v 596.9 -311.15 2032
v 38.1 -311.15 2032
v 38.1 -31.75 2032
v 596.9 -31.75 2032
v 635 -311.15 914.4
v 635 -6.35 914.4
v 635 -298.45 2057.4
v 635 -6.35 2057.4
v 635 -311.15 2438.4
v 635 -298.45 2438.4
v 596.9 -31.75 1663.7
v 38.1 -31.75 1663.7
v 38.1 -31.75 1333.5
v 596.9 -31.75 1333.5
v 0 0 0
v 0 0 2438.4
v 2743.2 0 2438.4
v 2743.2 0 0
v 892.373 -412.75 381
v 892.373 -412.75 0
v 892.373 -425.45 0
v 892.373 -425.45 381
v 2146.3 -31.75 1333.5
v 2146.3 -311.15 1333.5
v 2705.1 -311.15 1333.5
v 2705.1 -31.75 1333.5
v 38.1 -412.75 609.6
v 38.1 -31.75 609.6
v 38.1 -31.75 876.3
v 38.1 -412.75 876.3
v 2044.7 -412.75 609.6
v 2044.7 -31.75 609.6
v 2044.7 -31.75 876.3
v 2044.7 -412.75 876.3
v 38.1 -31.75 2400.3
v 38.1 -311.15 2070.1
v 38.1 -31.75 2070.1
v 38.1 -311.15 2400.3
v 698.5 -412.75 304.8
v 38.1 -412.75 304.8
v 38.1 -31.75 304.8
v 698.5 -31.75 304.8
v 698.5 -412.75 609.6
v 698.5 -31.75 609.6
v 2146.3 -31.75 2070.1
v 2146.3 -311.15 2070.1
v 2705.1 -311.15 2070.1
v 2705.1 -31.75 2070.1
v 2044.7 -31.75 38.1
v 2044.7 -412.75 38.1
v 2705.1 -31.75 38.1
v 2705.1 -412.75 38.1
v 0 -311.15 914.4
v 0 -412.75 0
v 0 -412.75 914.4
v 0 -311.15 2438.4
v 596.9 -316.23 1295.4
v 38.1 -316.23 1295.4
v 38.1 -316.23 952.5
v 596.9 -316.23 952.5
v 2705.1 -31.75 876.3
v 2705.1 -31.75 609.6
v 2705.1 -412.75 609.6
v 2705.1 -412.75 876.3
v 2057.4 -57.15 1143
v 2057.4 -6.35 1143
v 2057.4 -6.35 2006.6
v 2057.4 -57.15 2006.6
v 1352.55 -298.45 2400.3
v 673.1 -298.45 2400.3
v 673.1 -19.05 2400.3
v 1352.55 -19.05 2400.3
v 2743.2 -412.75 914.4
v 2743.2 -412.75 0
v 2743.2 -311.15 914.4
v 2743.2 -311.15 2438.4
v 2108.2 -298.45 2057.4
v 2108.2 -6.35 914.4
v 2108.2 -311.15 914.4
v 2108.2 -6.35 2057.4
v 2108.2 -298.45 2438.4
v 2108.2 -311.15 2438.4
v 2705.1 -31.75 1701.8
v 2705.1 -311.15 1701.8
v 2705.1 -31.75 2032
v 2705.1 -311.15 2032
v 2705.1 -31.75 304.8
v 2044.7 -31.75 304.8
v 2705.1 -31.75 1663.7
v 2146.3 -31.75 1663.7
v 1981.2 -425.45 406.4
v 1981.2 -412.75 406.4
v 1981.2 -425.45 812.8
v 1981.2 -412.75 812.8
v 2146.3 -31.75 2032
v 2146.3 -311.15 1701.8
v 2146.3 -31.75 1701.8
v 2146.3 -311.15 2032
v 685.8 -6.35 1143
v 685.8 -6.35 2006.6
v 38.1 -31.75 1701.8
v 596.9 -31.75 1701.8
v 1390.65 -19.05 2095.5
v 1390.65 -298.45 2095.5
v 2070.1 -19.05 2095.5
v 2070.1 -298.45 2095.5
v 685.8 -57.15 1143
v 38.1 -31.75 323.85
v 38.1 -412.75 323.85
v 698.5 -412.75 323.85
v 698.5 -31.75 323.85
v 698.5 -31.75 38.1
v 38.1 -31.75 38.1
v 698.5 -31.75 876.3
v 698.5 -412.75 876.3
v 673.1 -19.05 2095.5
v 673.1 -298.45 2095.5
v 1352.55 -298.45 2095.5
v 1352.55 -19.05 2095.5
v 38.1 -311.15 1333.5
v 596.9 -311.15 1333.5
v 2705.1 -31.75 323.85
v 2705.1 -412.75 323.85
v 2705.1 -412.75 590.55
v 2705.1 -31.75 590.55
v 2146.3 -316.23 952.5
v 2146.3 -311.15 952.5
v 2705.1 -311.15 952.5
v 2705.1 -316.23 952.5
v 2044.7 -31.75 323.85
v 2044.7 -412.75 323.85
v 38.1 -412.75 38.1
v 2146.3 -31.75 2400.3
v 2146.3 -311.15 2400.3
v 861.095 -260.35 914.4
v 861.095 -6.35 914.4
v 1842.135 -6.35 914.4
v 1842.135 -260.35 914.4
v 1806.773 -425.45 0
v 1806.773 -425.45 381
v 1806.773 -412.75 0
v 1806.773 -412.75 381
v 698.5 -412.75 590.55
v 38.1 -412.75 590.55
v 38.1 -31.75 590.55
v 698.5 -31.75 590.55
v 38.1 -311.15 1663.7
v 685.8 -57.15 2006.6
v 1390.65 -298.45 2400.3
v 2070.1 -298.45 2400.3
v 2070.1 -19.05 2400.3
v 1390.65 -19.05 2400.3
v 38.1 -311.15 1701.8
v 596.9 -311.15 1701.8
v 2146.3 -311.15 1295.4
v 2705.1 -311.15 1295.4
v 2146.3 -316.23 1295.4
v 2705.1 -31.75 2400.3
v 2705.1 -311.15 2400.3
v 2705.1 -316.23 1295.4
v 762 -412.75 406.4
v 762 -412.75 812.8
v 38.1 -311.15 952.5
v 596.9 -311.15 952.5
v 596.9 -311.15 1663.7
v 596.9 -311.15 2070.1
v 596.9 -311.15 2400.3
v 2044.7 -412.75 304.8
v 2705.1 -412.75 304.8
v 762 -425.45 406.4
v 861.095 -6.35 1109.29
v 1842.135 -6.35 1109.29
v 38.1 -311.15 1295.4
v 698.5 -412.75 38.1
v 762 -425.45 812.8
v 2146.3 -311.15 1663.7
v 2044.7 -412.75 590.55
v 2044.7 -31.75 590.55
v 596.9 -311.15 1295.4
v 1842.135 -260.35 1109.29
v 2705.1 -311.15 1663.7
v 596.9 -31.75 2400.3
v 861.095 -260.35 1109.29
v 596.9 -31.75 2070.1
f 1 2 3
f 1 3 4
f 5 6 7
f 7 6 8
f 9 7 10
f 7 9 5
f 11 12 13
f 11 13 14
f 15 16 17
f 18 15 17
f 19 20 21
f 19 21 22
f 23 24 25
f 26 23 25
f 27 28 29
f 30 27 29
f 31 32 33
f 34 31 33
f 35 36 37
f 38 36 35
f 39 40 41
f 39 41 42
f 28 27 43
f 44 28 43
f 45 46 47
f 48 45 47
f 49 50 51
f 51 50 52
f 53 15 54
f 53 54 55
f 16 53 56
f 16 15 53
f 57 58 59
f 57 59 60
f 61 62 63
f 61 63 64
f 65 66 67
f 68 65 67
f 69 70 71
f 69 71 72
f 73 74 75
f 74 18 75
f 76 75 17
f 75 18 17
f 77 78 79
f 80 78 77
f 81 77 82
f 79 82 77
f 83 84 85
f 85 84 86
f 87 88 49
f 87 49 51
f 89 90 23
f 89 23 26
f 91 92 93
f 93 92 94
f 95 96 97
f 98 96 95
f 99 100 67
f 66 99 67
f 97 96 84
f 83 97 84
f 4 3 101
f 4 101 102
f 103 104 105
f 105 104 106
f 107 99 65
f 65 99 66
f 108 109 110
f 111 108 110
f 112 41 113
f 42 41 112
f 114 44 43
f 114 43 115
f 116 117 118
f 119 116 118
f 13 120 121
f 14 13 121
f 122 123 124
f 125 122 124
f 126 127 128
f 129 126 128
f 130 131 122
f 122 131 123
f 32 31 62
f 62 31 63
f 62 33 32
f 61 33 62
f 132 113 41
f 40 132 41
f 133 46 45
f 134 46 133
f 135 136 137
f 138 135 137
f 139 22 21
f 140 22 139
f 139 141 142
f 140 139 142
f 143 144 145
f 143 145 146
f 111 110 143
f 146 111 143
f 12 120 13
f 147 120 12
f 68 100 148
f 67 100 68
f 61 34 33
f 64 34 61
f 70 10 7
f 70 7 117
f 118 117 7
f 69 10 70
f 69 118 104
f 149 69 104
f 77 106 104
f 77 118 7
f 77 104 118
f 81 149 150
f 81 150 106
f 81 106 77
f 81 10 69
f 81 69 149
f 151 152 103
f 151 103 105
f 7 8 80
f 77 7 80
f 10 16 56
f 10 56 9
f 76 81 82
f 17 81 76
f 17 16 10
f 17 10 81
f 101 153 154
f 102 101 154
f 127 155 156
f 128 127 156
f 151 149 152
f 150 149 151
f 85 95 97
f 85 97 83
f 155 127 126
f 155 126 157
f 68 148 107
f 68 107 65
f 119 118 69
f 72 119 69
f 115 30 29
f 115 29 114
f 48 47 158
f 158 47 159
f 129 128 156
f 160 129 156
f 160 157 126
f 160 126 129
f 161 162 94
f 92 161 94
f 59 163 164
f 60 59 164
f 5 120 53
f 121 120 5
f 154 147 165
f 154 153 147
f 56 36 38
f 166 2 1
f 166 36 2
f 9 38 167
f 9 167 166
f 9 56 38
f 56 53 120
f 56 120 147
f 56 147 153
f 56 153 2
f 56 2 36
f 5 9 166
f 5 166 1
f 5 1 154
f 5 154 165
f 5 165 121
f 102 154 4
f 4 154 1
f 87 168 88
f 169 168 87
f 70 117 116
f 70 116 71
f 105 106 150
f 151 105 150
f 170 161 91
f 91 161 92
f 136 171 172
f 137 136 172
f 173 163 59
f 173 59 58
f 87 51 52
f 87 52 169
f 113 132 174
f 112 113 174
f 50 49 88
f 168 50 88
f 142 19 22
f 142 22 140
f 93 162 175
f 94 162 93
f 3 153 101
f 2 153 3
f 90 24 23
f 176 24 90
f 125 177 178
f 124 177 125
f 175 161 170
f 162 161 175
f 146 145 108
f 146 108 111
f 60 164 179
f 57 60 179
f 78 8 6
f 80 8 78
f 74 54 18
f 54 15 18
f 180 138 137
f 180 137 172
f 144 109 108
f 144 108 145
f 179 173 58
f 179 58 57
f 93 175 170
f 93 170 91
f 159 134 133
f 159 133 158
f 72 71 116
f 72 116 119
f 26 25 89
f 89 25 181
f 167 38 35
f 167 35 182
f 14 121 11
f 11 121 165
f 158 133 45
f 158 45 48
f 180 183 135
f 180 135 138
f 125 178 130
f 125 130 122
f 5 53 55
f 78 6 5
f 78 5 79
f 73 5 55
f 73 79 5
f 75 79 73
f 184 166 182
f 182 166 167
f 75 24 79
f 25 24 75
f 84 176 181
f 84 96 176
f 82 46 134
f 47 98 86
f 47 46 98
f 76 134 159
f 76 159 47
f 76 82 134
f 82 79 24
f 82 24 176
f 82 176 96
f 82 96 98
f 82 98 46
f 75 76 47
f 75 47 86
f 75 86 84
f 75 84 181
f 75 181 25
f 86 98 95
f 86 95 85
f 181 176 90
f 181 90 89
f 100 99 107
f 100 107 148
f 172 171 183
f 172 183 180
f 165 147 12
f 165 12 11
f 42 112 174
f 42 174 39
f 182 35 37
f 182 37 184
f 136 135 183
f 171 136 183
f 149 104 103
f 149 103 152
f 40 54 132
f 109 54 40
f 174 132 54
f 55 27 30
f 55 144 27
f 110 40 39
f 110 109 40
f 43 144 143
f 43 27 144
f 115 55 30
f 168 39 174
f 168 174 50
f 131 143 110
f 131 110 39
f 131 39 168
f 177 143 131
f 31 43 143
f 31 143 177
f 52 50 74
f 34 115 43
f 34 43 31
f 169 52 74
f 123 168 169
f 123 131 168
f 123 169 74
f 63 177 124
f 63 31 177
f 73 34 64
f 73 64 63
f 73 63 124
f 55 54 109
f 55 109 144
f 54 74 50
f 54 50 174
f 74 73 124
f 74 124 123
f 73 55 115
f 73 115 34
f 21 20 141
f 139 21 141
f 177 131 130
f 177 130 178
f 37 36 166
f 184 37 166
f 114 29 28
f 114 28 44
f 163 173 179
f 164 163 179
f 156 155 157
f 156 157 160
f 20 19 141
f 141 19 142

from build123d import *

# Parameters (mm, degrees)
F0_W      = 2743.2
F0_H      = 2438.4
F1_DEPTH  = 6.35
F2_W      = 2743.2
F2_H      = 914.4
F3_DEPTH  = 406.4
F4_W      = 635
F4_H      = 1524
F5_DEPTH  = 304.8
F6_W      = 1473.2
F6_H      = 381
F7_DEPTH  = 292.1
F8_W      = 558.8
F8_H      = 330.2
F9_DEPTH  = 279.4
F10_W     = 679.45
F10_H     = 304.8
F11_DEPTH = 279.4
F12_W     = 1371.6
F12_H     = 863.6
F13_DEPTH = 50.8
F14_W     = 558.8
F14_H     = 342.9
F15_DEPTH = 5.08
F17_W     = 981.039941
F17_H     = 194.889765
F18_DEPTH = 254
F16_W     = 1219.2
F16_H     = 406.4
F19_DEPTH = 12.7
F20_W     = 914.4
F20_H     = 381
F21_DEPTH = 12.7
F22_W     = 660.4
F22_H     = 266.7
F23_DEPTH = 381


with BuildPart() as f1:
    # F0 (on Front) → F1 (new body)
    with BuildSketch(Plane.XZ):
        with Locations((1371.6, 1219.2)):
            Rectangle(F0_W, F0_H)
    extrude(amount=F1_DEPTH)

    # F2 (on face) → F3 (join)
    with BuildSketch(Plane.XZ.offset(6.35)):
        with Locations((1371.6, 457.2)):
            Rectangle(F2_W, F2_H)
    extrude(amount=F3_DEPTH)

    # F4 (on face) → F5 (join)
    with BuildSketch(Plane.XZ.offset(6.35)):
        with Locations((317.5, 1676.4)):
            Rectangle(F4_W, F4_H)
        with Locations((2425.7, 1676.4)):
            Rectangle(F4_W, F4_H)
    extrude(amount=F5_DEPTH)

    # F6 (on face) → F7 (join)
    with BuildSketch(Plane.XZ.offset(6.35)):
        with Locations((1371.6, 2247.9)):
            Rectangle(F6_W, F6_H)
    extrude(amount=F7_DEPTH)

    # F8 (on face) → F9 (cut)
    with BuildSketch(Plane.XZ.offset(311.15)):
        with Locations((317.5, 2235.2)):
            Rectangle(F8_W, F8_H)
        with Locations((317.5, 1866.9)):
            Rectangle(F8_W, F8_H)
        with Locations((317.5, 1498.6)):
            Rectangle(F8_W, F8_H)
        with Locations((2425.7, 1866.9)):
            Rectangle(F8_W, F8_H)
        with Locations((2425.7, 2235.2)):
            Rectangle(F8_W, F8_H)
        with Locations((2425.7, 1498.6)):
            Rectangle(F8_W, F8_H)
    extrude(amount=-F9_DEPTH, mode=Mode.SUBTRACT)

    # F10 (on face) → F11 (cut)
    with BuildSketch(Plane.XZ.offset(298.45)):
        with Locations((1012.825, 2247.9)):
            Rectangle(F10_W, F10_H)
        with Locations((1730.375, 2247.9)):
            Rectangle(F10_W, F10_H)
    extrude(amount=-F11_DEPTH, mode=Mode.SUBTRACT)

    # F22 (on face) → F23 (cut)
    with BuildSketch(Plane.XZ.offset(412.75)):
        with Locations((368.3, 171.45)):
            Rectangle(F22_W, F22_H)
        with Locations((368.3, 742.95)):
            Rectangle(F22_W, F22_H)
        with Locations((2374.9, 742.95)):
            Rectangle(F22_W, F22_H)
        with Locations((2374.9, 171.45)):
            Rectangle(F22_W, F22_H)
        with Locations((2374.9, 457.2)):
            Rectangle(F22_W, F22_H)
        with Locations((368.3, 457.2)):
            Rectangle(F22_W, F22_H)
    extrude(amount=-F23_DEPTH, mode=Mode.SUBTRACT)


with BuildPart() as f13:
    # F12 (on face) → F13 (new body)
    with BuildSketch(Plane.XZ.offset(6.35)):
        with Locations((1371.6, 1574.8)):
            Rectangle(F12_W, F12_H)
    extrude(amount=F13_DEPTH)


with BuildPart() as f15:
    # F14 (on face) → F15 (new body)
    with BuildSketch(Plane.XZ.offset(311.15)):
        with Locations((317.5, 1123.95)):
            Rectangle(F14_W, F14_H)
        with Locations((2425.7, 1123.95)):
            Rectangle(F14_W, F14_H)
    extrude(amount=F15_DEPTH)


with BuildPart() as f18:
    # F17 (on face) → F18 (new body)
    with BuildSketch(Plane.XZ.offset(6.35)):
        with Locations((1351.615458, 1011.844883)):
            Rectangle(F17_W, F17_H)
    extrude(amount=F18_DEPTH)


with BuildPart() as f19:
    # F16 (on face) → F19 (new body)
    with BuildSketch(Plane.XZ.offset(412.75)):
        with Locations((1371.6, 609.6)):
            Rectangle(F16_W, F16_H)
    extrude(amount=F19_DEPTH)


with BuildPart() as f21:
    # F20 (on face) → F21 (new body)
    with BuildSketch(Plane.XZ.offset(412.75)):
        with Locations((1349.573085, 190.5)):
            Rectangle(F20_W, F20_H)
    extrude(amount=F21_DEPTH)


solid = Compound([f1.part, f13.part, f15.part, f18.part, f19.part, f21.part])
